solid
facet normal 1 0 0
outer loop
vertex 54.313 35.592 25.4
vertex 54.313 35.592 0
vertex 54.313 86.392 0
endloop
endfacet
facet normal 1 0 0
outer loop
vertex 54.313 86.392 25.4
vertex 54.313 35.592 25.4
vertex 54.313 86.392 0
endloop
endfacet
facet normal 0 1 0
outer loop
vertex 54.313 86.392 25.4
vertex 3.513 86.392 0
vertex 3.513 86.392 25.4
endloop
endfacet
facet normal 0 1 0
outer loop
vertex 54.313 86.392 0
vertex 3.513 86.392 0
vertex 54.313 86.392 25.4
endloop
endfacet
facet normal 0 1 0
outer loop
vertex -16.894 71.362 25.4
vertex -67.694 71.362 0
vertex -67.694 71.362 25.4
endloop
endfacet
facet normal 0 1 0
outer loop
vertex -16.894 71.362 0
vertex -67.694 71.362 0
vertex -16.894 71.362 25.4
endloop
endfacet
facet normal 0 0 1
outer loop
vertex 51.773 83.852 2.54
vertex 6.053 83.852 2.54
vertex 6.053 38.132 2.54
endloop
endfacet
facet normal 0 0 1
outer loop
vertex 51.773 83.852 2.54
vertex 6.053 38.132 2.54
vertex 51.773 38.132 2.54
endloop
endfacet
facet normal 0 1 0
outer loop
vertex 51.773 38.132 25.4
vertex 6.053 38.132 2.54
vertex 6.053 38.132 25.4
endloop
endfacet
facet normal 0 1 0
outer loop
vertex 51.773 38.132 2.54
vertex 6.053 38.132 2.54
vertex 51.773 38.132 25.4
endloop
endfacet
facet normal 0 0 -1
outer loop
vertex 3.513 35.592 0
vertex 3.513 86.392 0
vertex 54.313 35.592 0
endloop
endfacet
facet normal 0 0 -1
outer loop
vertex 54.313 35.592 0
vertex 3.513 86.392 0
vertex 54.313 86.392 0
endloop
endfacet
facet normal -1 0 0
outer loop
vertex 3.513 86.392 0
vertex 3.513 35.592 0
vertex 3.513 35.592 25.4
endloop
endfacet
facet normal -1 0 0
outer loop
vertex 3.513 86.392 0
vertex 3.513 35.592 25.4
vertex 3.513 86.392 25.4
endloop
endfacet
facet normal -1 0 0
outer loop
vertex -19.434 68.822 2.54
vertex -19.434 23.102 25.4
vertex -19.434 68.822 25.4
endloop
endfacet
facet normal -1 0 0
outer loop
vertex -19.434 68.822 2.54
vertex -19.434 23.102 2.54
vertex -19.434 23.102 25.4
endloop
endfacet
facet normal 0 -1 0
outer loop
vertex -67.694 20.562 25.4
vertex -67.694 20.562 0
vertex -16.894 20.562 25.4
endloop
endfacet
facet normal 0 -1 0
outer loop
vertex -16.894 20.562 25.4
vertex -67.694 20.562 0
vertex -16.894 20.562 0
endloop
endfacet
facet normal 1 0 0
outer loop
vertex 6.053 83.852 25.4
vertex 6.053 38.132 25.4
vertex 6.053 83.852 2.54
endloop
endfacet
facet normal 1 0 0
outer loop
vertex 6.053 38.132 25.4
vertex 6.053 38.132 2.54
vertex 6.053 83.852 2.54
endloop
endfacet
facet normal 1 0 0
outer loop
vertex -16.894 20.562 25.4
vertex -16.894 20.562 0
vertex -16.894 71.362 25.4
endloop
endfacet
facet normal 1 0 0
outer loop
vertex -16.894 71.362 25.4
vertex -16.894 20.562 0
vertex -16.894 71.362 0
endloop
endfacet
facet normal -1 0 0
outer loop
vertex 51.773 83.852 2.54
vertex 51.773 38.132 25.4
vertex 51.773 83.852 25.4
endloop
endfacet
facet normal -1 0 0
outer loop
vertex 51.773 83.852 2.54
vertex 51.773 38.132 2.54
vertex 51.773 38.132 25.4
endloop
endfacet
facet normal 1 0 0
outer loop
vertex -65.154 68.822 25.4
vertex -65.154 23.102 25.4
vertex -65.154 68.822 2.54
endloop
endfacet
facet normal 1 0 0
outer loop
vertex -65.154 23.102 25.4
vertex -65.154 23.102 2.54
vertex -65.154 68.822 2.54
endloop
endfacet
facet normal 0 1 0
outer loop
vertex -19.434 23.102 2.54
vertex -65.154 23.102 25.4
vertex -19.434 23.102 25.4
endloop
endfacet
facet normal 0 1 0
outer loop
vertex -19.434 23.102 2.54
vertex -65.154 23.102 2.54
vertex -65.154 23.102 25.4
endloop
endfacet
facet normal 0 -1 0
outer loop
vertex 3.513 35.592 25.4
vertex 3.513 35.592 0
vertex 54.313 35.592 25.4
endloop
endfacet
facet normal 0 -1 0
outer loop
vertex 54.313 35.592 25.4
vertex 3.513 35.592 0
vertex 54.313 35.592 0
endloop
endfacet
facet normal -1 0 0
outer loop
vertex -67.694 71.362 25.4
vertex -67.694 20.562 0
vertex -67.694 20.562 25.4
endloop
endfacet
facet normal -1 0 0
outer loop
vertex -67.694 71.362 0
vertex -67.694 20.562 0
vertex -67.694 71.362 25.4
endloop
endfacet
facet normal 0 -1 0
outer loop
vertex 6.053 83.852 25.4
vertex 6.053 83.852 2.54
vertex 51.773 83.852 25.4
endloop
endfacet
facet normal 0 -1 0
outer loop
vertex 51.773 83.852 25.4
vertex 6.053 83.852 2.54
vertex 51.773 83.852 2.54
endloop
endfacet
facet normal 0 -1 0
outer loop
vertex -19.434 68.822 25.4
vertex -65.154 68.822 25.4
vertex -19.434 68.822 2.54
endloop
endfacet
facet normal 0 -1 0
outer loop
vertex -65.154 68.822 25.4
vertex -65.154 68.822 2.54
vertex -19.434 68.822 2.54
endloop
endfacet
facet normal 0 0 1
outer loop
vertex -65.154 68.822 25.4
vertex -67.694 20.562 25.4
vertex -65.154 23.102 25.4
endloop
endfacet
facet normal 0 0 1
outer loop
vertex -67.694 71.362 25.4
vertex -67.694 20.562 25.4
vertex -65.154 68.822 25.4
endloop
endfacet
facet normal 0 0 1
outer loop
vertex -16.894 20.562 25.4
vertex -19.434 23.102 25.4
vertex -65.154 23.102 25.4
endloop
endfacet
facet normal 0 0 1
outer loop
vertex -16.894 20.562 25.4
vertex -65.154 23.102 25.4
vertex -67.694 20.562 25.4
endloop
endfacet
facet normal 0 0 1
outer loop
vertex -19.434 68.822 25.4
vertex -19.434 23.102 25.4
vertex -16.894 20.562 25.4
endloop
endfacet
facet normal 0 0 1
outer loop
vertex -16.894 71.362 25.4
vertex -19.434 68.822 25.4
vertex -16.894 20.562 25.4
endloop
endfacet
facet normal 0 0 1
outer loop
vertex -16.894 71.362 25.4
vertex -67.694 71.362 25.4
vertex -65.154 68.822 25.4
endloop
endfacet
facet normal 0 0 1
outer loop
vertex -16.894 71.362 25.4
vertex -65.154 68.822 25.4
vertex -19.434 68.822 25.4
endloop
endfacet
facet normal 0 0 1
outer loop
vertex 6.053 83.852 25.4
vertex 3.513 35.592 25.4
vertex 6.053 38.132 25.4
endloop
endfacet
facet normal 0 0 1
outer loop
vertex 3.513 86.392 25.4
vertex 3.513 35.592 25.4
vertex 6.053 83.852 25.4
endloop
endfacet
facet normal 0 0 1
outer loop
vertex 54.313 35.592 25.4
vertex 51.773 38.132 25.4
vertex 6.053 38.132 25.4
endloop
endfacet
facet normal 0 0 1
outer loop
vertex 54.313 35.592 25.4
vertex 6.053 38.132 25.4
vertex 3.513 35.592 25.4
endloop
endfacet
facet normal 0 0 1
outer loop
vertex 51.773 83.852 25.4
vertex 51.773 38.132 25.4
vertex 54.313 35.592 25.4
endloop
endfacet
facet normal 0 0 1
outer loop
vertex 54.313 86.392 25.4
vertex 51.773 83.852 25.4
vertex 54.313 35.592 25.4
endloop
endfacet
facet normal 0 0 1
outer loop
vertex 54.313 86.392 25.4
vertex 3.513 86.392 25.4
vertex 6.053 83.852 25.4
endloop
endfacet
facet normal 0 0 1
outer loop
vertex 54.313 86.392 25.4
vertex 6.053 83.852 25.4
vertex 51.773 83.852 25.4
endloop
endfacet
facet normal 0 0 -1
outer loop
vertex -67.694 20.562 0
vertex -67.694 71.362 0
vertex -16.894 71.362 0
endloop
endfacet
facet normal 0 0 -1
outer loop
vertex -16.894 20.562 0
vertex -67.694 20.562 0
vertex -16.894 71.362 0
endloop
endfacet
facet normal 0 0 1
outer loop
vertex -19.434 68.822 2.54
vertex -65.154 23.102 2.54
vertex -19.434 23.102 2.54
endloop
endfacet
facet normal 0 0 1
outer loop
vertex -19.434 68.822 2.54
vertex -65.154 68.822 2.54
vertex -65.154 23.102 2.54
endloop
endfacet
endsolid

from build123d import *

# Parameters (mm, degrees)
F0_W     = 50.8
F0_H     = 50.8
F2_DEPTH = 25.4
F1_W     = 50.8
F1_H     = 50.8
F3_DEPTH = 25.4
F4_T     = -2.54
F4_2_T   = -2.54


with BuildPart() as f2:
    # F0 (on Top) → F2 (new body)
    with BuildSketch(Plane.XY):
        with Locations((-42.293565, 45.961652)):
            Rectangle(F0_W, F0_H)
    extrude(amount=F2_DEPTH)

    # F4#2
    f4_2_openings = [f2.faces().sort_by_distance(p)[0] for p in [
        (-42.293565, 45.961652, 25.4),
    ]]
    offset(amount=F4_2_T, openings=f4_2_openings)


with BuildPart() as f3:
    # F1 (on Top) → F3 (new body)
    with BuildSketch(Plane.XY):
        with Locations((28.912621, 60.99228)):
            Rectangle(F1_W, F1_H)
    extrude(amount=F3_DEPTH)

    # F4
    f4_openings = [f3.faces().sort_by_distance(p)[0] for p in [
        (28.912621, 60.99228, 25.4),
    ]]
    offset(amount=F4_T, openings=f4_openings)


solid = Compound([f2.part, f3.part])
